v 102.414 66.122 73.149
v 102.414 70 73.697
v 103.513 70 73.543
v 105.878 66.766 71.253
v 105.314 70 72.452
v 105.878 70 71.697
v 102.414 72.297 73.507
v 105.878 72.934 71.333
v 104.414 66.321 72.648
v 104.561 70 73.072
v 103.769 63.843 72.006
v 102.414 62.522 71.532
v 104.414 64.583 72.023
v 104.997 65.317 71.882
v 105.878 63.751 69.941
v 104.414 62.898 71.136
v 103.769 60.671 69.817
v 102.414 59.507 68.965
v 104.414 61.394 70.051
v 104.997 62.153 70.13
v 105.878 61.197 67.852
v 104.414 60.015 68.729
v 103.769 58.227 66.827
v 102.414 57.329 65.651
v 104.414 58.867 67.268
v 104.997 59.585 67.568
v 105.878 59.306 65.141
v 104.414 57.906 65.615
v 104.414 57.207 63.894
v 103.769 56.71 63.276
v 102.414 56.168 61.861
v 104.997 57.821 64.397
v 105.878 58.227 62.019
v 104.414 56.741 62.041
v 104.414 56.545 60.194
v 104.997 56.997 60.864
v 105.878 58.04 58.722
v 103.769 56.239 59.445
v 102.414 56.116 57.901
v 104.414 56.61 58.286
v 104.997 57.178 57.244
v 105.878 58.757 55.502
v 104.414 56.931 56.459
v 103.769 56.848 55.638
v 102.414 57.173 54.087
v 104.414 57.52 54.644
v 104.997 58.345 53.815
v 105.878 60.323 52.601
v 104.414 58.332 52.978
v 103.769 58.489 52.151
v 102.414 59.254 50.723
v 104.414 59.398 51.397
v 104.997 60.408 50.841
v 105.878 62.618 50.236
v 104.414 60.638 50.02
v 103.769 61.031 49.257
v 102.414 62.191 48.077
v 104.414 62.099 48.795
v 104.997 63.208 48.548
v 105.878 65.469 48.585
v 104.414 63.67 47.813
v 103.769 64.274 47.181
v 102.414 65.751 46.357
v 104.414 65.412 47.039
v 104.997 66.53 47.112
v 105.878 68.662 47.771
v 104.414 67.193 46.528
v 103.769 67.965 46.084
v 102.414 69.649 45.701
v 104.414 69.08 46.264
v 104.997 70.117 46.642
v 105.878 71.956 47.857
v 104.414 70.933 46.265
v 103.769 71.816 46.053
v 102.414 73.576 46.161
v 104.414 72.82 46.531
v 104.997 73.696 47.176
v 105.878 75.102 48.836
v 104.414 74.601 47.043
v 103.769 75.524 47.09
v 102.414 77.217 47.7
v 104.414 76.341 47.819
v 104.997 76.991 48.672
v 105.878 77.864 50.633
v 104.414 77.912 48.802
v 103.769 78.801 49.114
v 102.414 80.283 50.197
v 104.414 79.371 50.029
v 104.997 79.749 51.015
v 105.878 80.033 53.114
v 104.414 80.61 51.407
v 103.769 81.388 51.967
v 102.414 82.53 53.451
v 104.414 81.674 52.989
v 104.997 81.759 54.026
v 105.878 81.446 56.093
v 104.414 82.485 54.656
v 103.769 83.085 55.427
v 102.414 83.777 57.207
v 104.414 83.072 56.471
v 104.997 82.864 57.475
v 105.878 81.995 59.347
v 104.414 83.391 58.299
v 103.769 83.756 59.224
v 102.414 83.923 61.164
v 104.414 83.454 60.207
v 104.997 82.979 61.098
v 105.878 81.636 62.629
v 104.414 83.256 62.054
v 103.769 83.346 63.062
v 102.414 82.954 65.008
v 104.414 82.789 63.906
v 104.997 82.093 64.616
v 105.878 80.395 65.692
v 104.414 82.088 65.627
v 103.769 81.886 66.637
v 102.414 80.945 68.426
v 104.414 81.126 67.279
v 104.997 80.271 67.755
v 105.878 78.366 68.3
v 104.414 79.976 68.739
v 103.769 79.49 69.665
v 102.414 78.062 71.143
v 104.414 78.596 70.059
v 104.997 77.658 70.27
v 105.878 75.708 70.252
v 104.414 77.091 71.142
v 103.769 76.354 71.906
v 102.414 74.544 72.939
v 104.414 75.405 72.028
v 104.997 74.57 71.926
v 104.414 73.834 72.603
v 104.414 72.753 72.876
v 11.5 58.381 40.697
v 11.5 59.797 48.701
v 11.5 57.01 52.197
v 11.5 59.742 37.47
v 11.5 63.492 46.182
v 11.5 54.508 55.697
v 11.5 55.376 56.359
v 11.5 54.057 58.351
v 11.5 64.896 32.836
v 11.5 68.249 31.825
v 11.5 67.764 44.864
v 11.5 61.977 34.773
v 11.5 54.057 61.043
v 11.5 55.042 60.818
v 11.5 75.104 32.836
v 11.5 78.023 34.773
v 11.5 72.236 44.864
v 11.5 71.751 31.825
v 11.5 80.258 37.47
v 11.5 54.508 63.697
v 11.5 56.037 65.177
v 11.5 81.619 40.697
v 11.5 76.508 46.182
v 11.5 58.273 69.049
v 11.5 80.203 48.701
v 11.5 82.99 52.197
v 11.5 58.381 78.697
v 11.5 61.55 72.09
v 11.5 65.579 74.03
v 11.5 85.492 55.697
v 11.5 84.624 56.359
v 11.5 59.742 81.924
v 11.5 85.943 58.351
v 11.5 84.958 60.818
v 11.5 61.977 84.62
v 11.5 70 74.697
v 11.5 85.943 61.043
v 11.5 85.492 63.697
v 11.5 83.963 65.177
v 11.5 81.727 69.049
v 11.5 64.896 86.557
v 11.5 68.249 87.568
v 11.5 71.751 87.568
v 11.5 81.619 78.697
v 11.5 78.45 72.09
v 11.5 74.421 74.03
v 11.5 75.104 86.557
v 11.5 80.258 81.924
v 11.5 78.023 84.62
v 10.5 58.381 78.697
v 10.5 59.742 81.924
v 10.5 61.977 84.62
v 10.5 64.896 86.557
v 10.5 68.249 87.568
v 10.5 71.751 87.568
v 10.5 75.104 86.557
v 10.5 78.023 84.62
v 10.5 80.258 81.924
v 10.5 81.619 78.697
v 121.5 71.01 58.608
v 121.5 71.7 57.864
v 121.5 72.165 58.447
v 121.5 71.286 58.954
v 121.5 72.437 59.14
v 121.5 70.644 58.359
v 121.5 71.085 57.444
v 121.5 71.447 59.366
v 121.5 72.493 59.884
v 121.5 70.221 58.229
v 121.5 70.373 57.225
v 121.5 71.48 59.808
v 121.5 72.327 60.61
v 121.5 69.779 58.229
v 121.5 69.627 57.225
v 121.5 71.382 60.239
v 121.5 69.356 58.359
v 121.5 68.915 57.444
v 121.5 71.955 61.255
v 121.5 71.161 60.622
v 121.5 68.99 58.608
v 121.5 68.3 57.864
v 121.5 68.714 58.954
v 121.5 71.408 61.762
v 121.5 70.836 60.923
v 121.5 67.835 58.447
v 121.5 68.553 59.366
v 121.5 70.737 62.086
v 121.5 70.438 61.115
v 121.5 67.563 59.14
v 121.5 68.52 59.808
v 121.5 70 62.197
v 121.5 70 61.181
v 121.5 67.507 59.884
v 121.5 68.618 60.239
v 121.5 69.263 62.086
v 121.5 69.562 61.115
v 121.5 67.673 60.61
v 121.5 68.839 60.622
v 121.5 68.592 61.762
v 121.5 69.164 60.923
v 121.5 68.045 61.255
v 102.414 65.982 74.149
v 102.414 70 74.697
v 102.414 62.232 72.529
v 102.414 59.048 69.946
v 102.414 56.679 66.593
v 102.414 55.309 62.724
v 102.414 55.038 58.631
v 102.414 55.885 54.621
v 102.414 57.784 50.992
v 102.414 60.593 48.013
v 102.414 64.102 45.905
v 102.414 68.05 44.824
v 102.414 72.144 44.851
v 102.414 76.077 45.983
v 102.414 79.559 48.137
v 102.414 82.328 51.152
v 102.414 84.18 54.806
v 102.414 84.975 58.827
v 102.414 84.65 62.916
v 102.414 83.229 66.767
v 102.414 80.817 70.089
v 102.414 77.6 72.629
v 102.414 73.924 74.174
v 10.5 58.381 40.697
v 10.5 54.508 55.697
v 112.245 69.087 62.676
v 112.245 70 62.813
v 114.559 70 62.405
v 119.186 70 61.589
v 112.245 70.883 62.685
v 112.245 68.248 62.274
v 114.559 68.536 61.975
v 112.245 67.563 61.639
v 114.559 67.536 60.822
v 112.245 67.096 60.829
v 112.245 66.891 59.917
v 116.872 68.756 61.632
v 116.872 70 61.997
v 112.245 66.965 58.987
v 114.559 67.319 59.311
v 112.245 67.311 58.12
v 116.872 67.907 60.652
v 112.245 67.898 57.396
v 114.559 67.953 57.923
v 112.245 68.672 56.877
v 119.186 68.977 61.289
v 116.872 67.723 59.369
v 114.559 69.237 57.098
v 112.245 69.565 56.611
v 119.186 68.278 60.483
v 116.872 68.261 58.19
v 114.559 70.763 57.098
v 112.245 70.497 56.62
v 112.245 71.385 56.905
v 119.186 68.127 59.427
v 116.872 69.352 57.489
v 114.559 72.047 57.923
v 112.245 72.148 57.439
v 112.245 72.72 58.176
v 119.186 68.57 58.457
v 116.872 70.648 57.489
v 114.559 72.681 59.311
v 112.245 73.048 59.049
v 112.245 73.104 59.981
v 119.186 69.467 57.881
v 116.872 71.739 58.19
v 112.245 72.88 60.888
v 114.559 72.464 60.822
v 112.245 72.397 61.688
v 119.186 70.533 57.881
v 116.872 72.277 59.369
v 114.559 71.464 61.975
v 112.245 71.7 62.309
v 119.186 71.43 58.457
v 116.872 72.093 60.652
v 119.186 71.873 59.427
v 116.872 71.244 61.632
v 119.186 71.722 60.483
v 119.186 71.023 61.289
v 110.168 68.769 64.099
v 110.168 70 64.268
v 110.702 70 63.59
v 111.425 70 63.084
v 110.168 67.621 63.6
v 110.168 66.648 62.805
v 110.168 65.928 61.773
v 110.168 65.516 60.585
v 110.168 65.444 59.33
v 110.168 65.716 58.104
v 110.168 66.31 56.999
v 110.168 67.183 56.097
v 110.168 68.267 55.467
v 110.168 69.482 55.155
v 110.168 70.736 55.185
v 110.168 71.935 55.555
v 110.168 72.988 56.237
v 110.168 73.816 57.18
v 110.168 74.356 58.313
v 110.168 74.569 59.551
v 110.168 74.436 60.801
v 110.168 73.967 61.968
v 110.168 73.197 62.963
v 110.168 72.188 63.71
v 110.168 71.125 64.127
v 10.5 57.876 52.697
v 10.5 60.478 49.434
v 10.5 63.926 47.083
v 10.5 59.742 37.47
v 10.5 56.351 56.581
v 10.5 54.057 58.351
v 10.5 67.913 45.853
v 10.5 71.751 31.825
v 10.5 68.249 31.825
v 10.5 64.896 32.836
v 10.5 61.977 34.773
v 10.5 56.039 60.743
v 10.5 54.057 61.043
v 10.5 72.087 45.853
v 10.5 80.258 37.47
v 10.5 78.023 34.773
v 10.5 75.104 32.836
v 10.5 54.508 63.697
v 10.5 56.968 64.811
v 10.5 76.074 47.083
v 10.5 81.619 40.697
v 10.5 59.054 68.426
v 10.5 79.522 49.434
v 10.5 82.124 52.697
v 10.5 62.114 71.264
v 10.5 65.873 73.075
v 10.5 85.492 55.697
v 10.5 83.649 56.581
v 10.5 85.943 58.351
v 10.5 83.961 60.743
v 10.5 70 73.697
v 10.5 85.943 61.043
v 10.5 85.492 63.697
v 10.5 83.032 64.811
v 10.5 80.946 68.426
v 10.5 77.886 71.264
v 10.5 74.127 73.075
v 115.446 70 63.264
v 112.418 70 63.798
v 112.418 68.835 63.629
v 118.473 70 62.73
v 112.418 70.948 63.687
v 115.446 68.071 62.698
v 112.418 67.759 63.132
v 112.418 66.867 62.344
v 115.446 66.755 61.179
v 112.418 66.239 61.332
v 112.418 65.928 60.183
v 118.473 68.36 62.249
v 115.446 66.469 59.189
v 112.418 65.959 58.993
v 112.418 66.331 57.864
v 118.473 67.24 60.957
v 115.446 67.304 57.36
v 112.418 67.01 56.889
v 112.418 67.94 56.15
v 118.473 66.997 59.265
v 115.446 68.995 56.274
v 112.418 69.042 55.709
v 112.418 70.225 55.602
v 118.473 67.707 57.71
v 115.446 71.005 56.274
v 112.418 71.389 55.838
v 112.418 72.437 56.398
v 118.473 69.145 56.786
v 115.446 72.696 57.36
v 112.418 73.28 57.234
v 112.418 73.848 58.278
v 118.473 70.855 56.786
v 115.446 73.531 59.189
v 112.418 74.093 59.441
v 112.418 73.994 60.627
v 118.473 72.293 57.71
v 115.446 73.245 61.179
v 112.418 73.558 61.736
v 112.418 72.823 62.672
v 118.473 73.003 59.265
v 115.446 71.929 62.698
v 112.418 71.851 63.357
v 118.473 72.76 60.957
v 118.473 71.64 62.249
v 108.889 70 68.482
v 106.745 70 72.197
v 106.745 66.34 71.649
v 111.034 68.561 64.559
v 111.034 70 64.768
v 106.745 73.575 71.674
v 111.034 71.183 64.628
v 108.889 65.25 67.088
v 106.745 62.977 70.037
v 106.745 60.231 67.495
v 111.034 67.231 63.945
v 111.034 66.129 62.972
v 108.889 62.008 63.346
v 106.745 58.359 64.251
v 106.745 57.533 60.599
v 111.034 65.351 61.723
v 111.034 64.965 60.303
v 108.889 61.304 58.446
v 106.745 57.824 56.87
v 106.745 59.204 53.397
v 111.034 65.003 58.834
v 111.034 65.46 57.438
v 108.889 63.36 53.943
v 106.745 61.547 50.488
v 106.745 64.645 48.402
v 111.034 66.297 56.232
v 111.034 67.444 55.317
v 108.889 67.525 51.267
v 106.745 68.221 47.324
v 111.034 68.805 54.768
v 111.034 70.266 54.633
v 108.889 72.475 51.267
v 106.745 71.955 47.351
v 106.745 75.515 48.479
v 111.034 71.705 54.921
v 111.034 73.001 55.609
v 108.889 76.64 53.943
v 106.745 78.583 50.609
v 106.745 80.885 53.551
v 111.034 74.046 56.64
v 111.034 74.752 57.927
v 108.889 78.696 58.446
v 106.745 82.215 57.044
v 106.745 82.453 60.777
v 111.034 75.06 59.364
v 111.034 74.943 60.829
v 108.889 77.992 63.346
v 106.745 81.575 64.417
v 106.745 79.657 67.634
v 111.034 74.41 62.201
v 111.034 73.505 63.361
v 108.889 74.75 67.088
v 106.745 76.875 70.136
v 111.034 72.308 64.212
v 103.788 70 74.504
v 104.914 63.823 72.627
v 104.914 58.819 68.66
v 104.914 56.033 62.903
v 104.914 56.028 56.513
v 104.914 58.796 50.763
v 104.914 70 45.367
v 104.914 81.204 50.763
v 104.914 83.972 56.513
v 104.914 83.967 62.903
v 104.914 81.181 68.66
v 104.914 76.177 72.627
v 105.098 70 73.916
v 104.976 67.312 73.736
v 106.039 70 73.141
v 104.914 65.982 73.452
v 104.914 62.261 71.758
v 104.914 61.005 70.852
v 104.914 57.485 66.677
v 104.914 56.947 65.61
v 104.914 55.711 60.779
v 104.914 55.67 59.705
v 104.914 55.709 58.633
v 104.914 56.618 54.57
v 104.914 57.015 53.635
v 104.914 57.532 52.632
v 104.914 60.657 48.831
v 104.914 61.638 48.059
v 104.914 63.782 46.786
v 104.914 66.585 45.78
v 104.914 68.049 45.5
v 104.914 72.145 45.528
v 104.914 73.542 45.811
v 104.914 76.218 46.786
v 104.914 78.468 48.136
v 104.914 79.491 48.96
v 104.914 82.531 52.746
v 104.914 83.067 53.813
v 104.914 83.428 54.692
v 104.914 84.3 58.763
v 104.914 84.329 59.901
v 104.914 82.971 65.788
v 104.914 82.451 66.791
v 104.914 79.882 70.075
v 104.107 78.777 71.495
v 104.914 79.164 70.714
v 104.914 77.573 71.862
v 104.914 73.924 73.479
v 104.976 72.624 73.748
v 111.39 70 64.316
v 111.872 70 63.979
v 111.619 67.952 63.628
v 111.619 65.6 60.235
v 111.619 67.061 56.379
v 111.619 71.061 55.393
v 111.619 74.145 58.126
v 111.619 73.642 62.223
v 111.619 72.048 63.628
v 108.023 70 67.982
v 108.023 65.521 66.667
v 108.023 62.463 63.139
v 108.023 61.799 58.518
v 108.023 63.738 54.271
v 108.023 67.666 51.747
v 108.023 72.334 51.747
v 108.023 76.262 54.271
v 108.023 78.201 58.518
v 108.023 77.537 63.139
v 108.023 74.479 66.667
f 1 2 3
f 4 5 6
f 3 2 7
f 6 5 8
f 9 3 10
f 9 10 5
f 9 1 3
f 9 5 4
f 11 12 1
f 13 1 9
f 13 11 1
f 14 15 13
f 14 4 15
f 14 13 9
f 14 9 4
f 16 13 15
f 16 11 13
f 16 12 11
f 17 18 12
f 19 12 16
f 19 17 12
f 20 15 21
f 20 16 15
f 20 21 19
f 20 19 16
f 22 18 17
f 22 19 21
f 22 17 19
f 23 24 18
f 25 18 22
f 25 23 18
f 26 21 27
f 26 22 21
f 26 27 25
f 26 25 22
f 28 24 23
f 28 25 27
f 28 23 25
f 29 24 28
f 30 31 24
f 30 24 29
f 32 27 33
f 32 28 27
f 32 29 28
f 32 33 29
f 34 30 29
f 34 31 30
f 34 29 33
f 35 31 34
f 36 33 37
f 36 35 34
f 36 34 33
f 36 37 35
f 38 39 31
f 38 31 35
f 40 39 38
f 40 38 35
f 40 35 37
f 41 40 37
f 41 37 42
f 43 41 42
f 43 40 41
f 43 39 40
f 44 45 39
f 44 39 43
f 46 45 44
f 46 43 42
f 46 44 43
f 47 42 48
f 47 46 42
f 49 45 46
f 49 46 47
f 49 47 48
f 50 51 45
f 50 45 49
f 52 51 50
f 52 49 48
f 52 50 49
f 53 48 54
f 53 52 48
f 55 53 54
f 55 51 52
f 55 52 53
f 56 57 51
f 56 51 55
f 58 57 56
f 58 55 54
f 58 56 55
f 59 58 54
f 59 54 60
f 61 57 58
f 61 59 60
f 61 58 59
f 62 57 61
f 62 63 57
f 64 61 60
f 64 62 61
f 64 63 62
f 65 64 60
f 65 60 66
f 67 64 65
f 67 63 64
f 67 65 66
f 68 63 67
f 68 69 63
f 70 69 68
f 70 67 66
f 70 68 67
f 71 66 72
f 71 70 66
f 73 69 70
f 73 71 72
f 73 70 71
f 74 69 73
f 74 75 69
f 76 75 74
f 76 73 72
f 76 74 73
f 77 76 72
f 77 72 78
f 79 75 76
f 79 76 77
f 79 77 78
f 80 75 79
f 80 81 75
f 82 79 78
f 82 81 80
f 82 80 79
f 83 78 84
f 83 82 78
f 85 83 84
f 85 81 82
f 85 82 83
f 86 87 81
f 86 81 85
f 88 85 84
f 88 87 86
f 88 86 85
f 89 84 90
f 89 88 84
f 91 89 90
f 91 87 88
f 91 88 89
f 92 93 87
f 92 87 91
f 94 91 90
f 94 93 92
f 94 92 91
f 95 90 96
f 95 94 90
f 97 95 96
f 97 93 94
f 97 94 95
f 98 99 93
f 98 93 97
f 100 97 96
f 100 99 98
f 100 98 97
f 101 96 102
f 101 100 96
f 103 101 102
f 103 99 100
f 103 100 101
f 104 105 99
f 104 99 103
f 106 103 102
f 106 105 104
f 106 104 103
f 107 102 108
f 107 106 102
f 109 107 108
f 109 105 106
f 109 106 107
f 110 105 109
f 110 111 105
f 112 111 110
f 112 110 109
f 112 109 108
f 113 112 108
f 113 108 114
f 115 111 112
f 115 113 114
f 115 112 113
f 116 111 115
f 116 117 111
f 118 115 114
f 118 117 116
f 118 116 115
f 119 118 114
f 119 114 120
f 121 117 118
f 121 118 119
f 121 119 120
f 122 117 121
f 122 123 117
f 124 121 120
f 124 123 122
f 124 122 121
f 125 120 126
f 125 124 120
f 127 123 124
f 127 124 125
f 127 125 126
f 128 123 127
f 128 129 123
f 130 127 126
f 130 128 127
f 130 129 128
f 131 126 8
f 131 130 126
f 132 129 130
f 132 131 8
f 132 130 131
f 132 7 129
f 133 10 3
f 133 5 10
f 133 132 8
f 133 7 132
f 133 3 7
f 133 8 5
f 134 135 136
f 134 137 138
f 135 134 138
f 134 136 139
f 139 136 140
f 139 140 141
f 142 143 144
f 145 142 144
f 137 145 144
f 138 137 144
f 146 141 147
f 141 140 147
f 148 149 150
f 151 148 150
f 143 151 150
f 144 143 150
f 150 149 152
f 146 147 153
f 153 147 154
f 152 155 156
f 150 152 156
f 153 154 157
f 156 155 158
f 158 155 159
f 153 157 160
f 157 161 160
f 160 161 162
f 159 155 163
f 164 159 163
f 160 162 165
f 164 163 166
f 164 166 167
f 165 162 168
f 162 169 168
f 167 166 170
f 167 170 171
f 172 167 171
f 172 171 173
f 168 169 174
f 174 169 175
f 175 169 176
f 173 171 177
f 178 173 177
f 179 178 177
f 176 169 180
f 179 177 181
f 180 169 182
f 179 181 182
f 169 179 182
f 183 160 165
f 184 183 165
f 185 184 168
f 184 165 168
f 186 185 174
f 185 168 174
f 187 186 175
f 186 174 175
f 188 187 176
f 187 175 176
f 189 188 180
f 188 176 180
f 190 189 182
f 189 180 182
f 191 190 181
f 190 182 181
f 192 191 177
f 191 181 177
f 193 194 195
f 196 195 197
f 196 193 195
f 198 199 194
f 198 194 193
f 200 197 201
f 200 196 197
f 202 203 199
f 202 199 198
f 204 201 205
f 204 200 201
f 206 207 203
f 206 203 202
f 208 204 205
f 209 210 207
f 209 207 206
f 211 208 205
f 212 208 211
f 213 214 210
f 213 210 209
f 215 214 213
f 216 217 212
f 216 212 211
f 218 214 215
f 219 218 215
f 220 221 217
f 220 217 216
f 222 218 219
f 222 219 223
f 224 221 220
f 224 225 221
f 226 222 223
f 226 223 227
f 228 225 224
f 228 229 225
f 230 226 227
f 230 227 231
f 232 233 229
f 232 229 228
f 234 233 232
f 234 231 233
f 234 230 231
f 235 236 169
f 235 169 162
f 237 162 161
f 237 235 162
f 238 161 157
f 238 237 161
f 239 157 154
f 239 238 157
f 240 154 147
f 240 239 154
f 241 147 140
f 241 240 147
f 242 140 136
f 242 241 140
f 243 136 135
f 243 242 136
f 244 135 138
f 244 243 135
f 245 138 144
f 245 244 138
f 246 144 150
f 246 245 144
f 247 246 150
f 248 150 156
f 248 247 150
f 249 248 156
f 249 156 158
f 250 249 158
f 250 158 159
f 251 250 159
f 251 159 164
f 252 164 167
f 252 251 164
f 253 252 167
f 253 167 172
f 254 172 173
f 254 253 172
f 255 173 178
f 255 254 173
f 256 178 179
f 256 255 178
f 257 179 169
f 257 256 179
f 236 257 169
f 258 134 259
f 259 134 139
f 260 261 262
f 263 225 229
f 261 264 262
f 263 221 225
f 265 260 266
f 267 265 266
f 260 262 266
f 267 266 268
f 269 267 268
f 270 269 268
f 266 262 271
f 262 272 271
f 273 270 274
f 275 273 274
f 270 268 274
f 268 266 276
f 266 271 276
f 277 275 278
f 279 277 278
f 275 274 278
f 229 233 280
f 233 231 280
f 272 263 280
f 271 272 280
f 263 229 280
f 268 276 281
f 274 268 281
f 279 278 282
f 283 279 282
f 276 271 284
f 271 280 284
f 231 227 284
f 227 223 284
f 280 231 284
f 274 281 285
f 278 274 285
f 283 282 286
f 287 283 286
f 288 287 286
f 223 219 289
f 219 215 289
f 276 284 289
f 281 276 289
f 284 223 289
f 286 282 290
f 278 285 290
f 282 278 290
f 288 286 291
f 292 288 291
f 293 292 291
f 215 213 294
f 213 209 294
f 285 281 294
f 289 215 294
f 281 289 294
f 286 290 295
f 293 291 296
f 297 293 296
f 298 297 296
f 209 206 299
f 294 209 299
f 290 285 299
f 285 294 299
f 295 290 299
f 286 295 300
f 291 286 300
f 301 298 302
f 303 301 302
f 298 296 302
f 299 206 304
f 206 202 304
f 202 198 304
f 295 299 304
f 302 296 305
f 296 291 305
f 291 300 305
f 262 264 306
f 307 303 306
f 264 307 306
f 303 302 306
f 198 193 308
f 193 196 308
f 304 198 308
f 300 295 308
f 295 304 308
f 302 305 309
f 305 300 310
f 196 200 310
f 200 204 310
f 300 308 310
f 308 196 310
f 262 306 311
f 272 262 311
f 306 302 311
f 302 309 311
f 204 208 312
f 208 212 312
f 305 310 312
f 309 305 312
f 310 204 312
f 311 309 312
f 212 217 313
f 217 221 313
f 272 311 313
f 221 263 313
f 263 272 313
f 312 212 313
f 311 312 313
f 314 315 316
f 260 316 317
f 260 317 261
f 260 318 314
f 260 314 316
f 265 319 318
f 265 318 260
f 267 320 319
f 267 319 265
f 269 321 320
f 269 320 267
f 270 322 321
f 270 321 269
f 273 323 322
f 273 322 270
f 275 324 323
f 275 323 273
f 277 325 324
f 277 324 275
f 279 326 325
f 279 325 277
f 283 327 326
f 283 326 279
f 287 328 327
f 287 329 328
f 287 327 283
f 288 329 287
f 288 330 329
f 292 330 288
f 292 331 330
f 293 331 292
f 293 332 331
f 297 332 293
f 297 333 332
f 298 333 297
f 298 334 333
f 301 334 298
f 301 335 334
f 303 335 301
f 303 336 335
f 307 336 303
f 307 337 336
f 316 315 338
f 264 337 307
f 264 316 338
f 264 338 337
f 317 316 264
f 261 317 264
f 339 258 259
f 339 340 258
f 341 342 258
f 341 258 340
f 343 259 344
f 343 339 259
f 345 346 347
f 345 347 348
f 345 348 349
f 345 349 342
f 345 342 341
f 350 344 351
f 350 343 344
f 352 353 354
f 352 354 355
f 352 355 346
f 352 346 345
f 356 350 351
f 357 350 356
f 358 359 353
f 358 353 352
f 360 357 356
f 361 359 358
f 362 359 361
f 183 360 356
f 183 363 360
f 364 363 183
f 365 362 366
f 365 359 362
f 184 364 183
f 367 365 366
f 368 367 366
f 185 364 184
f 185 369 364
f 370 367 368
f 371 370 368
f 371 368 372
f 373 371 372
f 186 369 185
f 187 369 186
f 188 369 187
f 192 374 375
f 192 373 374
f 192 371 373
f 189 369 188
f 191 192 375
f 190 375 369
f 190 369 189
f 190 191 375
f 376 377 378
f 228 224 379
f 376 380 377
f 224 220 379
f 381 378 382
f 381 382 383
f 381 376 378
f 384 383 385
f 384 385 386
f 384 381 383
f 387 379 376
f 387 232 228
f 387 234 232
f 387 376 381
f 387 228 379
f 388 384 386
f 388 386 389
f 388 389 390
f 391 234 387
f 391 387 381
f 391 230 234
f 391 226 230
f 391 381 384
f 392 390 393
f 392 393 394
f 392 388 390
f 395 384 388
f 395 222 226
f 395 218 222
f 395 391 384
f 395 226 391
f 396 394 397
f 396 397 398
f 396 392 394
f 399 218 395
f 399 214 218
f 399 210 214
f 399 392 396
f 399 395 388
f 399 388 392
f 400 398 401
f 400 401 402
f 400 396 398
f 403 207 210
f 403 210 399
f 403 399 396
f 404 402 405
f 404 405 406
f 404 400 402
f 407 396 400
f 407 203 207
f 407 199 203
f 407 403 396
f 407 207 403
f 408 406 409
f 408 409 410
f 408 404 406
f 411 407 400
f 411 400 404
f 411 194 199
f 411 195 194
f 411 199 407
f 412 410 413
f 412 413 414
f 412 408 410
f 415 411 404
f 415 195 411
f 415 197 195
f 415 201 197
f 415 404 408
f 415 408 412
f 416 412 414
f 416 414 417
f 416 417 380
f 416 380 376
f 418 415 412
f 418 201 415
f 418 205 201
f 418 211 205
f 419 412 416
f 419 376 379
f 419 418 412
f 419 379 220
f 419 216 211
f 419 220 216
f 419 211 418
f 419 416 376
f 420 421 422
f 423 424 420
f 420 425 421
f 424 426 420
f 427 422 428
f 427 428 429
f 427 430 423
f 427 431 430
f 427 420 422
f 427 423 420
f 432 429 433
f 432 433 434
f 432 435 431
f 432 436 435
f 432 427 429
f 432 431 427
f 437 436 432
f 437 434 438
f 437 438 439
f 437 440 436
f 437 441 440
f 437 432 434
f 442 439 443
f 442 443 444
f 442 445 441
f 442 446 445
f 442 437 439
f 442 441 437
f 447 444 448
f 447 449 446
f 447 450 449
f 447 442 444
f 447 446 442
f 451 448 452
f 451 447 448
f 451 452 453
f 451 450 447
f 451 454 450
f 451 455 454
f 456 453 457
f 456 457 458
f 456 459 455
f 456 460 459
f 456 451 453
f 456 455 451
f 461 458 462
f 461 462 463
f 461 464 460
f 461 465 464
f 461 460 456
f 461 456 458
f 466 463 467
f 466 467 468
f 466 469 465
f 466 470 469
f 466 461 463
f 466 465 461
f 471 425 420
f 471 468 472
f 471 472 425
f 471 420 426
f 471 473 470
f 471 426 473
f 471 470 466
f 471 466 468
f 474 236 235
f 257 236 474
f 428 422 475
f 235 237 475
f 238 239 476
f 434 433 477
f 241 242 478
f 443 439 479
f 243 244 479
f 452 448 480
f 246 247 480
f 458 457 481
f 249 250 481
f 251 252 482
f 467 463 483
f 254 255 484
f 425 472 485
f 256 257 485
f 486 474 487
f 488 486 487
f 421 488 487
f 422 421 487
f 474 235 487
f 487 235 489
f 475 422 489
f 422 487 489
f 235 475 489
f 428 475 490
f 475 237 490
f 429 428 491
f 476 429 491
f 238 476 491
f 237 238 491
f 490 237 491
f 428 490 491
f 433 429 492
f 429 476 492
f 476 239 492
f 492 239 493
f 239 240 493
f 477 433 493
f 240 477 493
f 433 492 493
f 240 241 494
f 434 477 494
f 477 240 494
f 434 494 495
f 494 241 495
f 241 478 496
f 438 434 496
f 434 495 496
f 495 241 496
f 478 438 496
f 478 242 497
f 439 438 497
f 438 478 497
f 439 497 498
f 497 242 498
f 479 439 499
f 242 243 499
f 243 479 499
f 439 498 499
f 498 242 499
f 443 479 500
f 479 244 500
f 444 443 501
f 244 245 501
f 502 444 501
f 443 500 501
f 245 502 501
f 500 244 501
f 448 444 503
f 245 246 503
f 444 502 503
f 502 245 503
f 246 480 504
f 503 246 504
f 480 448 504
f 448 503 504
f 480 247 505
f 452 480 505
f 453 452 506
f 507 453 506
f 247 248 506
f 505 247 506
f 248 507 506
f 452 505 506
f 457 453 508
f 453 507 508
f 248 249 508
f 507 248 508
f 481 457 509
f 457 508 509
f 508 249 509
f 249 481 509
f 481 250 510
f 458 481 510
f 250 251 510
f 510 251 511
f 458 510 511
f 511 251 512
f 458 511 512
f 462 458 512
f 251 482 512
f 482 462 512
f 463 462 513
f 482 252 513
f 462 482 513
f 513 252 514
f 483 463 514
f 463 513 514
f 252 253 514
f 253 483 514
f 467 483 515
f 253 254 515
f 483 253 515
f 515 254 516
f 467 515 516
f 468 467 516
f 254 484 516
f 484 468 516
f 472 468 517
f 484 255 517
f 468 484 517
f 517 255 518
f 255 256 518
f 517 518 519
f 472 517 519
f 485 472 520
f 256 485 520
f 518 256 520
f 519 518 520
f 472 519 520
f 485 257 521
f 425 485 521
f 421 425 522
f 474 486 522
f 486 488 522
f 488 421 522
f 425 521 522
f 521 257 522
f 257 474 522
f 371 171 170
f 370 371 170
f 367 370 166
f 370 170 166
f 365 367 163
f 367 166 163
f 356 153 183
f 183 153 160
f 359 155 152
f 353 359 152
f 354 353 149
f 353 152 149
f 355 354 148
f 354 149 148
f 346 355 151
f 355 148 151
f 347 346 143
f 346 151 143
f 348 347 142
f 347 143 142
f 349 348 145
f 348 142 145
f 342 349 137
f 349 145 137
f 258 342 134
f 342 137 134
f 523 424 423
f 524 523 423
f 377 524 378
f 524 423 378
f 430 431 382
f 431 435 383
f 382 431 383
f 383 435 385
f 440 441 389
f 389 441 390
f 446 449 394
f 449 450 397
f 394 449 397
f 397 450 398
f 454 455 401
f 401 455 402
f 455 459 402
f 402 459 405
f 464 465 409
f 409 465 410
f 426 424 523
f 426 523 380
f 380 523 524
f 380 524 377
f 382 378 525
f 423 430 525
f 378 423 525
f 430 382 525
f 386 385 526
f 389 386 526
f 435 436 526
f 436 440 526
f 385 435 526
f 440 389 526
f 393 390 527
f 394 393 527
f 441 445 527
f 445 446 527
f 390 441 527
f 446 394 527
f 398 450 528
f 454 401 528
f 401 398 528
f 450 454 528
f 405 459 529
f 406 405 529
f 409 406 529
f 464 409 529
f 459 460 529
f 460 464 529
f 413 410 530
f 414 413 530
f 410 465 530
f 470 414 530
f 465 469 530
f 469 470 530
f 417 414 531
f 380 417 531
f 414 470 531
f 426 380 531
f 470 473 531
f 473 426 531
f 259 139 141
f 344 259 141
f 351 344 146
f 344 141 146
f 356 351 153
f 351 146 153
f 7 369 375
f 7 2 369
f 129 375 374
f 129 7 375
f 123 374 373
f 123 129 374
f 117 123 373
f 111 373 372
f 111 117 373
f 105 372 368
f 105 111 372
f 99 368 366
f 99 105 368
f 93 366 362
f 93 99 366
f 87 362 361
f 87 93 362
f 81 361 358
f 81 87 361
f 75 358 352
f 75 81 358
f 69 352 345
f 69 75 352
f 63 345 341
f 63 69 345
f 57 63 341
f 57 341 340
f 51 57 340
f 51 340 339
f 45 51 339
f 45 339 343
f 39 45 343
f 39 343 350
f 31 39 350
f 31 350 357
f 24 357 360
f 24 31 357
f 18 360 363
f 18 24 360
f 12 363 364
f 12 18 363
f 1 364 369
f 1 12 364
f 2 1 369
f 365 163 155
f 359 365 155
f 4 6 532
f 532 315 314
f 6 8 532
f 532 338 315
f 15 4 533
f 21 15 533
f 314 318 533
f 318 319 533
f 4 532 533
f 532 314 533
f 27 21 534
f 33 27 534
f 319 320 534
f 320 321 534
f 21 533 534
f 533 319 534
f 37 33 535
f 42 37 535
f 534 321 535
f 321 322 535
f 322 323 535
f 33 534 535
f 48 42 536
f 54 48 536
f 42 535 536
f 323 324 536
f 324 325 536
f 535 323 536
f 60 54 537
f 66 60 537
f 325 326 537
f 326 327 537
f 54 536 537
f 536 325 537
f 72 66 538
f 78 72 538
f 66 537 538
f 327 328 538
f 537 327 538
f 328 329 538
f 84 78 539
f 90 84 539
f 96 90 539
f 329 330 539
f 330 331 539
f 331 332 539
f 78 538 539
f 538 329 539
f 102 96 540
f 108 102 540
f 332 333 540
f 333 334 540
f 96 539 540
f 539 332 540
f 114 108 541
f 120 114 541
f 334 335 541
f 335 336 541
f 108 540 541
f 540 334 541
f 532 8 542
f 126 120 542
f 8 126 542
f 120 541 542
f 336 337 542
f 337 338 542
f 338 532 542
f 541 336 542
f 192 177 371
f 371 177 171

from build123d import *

# Parameters (mm, degrees)
BOSS_EXTRUDE1_DEPTH     = 90
FILLET1_R               = 7.5
FILLET2_R               = 2
SKETCH2_W               = 20
SKETCH2_H               = 80
SKETCH2_W_2             = 32
BOSS_EXTRUDE2_DEPTH     = 20
SKETCH3_R               = 2.5
BOSS_EXTRUDE3_DEPTH     = 111
BOSS_EXTRUDE4_START     = 7.5
SKETCH4_W               = 80
SKETCH4_H               = 20
SKETCH4_R               = 3.25
BOSS_EXTRUDE4_DEPTH     = 20
MOVE_FACE1_BY           = 1.5
MOVE_FACE2_BY           = 1.5
FILLET3_R               = 4
FILLET4_R               = 4
CUT_EXTRUDE1_DEPTH      = 2
BOSS_EXTRUDE5_DEPTH     = 2
SKETCH7_W               = 58
SKETCH7_H               = 15
CUT_EXTRUDE2_DEPTH      = 0.5
SKETCH8_R               = 10
BOSS_EXTRUDE6_DEPTH     = 1.5
SKETCH10_R              = 4.25
SKETCH10_R_2            = 2.75
CUT_EXTRUDE_THIN1_DEPTH = 1.5
SKETCH11_RX             = 5
SKETCH11_RY             = 2.5
BOSS_EXTRUDE7_DEPTH     = 1.5
LPATTERN1_COUNT         = 3
LPATTERN1_PITCH         = 24
SKETCH12_RX             = 5
SKETCH12_RY             = 2.5
BOSS_EXTRUDE8_DEPTH     = 1.5
LPATTERN2_START         = 113.13708499
LPATTERN2_DEPTH         = 1.5
FILLET7_R               = 7.5
FILLET5_R               = 5
FILLET6_R               = 2
SHELL1_T                = -1
SKETCH14_R              = 14
BOSS_EXTRUDE9_DEPTH     = 1
BOSS_EXTRUDE10_DEPTH    = 1
BOSS_EXTRUDE11_START    = -30
SKETCH16_R              = 13
BOSS_EXTRUDE11_DEPTH    = 10
BOSS_EXTRUDE12_REACH    = 233.484
SKETCH18_R              = 3
SKETCH17_W              = 1.5
SKETCH17_H              = 20
SKETCH17_W_2            = 20
SKETCH17_H_2            = 1.5
EXTRUDE_THIN1_DEPTH     = 63.5
SKETCH20_R              = 12.5
BOSS_EXTRUDE13_DEPTH    = 5
FILLET8_R               = 2


# Read off the part's stored shape, not the designer's step: LPattern2, Body-Move/Copy1
with BuildPart() as part:
    # Sketch1 → Boss-Extrude1 (new, symmetric)
    with BuildSketch(Plane(origin=(0, 0, 0), x_dir=(0, 0, -1), z_dir=(1, 0, 0))):
        Polygon((0, 0), (0, 45), (-115, 45), (-160, 0), align=None)
    extrude(amount=BOSS_EXTRUDE1_DEPTH, both=True)

    # Fillet1
    fillet1_edges = [part.edges().sort_by_distance(p)[0] for p in [
        (0, 0, 160),
        (0, 45, 115),
        (0, 45, 0),
        (0, 0, 0),
    ]]
    fillet(fillet1_edges, radius=FILLET1_R)

    # Fillet2
    fillet2_edges = [part.edges().sort_by_distance(p)[0] for p in [
        (-90, 0, 74.696699141),
        (90, 0, 74.696699141),
        (-90, 27.803300859, 132.196699141),
        (-90, 45, 59.696699141),
        (-90, 22.5, 0),
        (-90, 44.429096494, 114.763524025),
        (-90, 2.196699141, 2.196699141),
        (-90, 42.803300859, 2.196699141),
        (-90, 4.629874257, 148.822494776),
        (90, 27.803300859, 132.196699141),
        (90, 22.5, 0),
        (90, 45, 59.696699141),
        (90, 44.429096494, 114.763524025),
        (90, 2.196699141, 2.196699141),
        (90, 42.803300859, 2.196699141),
        (90, 4.629874257, 148.822494776),
    ]]
    fillet(fillet2_edges, radius=FILLET2_R)

    # Sketch2 → Boss-Extrude2 (add)
    with BuildSketch(Plane(origin=(0, 45, 0), x_dir=(1, 0, 0), z_dir=(0, 1, 0))):
        with Locations((-71.5, -59.696699141)):
            Rectangle(SKETCH2_W, SKETCH2_H)
        with Locations((65.5, -59.696699141)):
            Rectangle(SKETCH2_W_2, SKETCH2_H)
    extrude(amount=BOSS_EXTRUDE2_DEPTH)

    # Sketch3 → Boss-Extrude3 (add)
    with BuildSketch(Plane(origin=(-61.5, 0, 0), x_dir=(0, 0, -1), z_dir=(1, 0, 0))):
        with Locations(Location((-89.696699141, 59.5, 0), (0, 0, 180))):
            Circle(SKETCH3_R)
        with Locations(Location((-89.696699141, 50.5, 0), (0, 0, 180))):
            Circle(SKETCH3_R)
        with Locations(Location((-29.696699141, 50.5, 0), (0, 0, 180))):
            Circle(SKETCH3_R)
        with Locations(Location((-29.696699141, 59.5, 0), (0, 0, 180))):
            Circle(SKETCH3_R)
    extrude(amount=BOSS_EXTRUDE3_DEPTH)

    # Fillet3
    fillet3_edges = [part.edges().sort_by_distance(p)[0] for p in [
        (65.5, 65, 99.696699141),
        (65.5, 65, 19.696699141),
        (-71.5, 65, 99.696699141),
        (-71.5, 65, 19.696699141),
    ]]
    fillet(fillet3_edges, radius=FILLET3_R)

    # Sketch5 → Cut-Extrude1 (cut)
    with BuildSketch(Plane(origin=(0, 80, 80), x_dir=(1, 0, 0), z_dir=(0, 0.7071067811865511, 0.707106781186544))):
        with BuildLine():
            Line((-65, -56.317279836), (65, -56.317279836))
            ThreePointArc((65, -56.317279836), (66.767766953, -57.049512883), (67.5, -58.817279836))
            Line((67.5, -58.817279836), (67.5, -88.817279836))
            ThreePointArc((67.5, -88.817279836), (66.767766953, -90.585046789), (65, -91.317279836))
            Line((65, -91.317279836), (-65, -91.317279836))
            ThreePointArc((-65, -91.317279836), (-66.767766953, -90.585046789), (-67.5, -88.817279836))
            Line((-67.5, -88.817279836), (-67.5, -58.817279836))
            ThreePointArc((-67.5, -58.817279836), (-66.767766953, -57.049512883), (-65, -56.317279836))
        make_face()
    extrude(amount=-CUT_EXTRUDE1_DEPTH, mode=Mode.SUBTRACT)


with BuildPart() as body_2:
    # Sketch4 → Boss-Extrude4 (new body)
    with BuildSketch(Plane(origin=(-61.5, 0, 0), x_dir=(0, 0, -1), z_dir=(1, 0, 0)).offset(BOSS_EXTRUDE4_START)):
        with Locations((-59.696699141, 55)):
            Rectangle(SKETCH4_W, SKETCH4_H)
        with Locations((-89.696699141, 59.5)):
            Circle(SKETCH4_R, mode=Mode.SUBTRACT)
        with Locations((-89.696699141, 50.5)):
            Circle(SKETCH4_R, mode=Mode.SUBTRACT)
        with Locations((-29.696699141, 59.5)):
            Circle(SKETCH4_R, mode=Mode.SUBTRACT)
        with Locations((-29.696699141, 50.5)):
            Circle(SKETCH4_R, mode=Mode.SUBTRACT)
    extrude(amount=BOSS_EXTRUDE4_DEPTH)

    # Move Face1: a face moved outward by 1.5
    extrude(body_2.faces().sort_by_distance((-44, 65, 59.696699141))[0], amount=MOVE_FACE1_BY, dir=(0, 1, 0))

    # Move Face2: a face moved inward by 1.5
    extrude(body_2.faces().sort_by_distance((-44, 45, 59.696699141))[0], amount=MOVE_FACE2_BY, dir=(0, 1, 0), mode=Mode.SUBTRACT)

    # Fillet4
    fillet4_edges = [body_2.edges().sort_by_distance(p)[0] for p in [
        (-44, 66.5, 99.696699141),
        (-44, 66.5, 19.696699141),
        (-44, 46.5, 19.696699141),
        (-44, 46.5, 99.696699141),
    ]]
    fillet(fillet4_edges, radius=FILLET4_R)


with BuildPart() as body_3:
    # Sketch6 → Boss-Extrude5 (new body)
    with BuildSketch(Plane(origin=(0, 78.585786438, 78.585786438), x_dir=(1, 0, 0), z_dir=(0, 0.7071067811865509, 0.7071067811865441))):
        with BuildLine():
            Line((65, -56.317279836), (-65, -56.317279836))
            ThreePointArc((-65, -56.317279836), (-66.767766953, -57.049512883), (-67.5, -58.817279836))
            Line((-67.5, -58.817279836), (-67.5, -88.817279836))
            ThreePointArc((-67.5, -88.817279836), (-66.767766953, -90.585046789), (-65, -91.317279836))
            Line((-65, -91.317279836), (65, -91.317279836))
            ThreePointArc((65, -91.317279836), (66.767766953, -90.585046789), (67.5, -88.817279836))
            Line((67.5, -88.817279836), (67.5, -58.817279836))
            ThreePointArc((67.5, -58.817279836), (66.767766953, -57.049512883), (65, -56.317279836))
        make_face()
    extrude(amount=BOSS_EXTRUDE5_DEPTH)

    # Sketch7 → Cut-Extrude2 (cut)
    with BuildSketch(Plane(origin=(0, 80, 80), x_dir=(1, 0, 0), z_dir=(0, 0.7071067811865509, 0.7071067811865441))):
        with Locations((-28.5, -71.817279836)):
            Rectangle(SKETCH7_W, SKETCH7_H)
    extrude(amount=-CUT_EXTRUDE2_DEPTH, mode=Mode.SUBTRACT)

    # Sketch8 → Boss-Extrude6 (add)
    with BuildSketch(Plane(origin=(0, 80, 80), x_dir=(1, 0, 0), z_dir=(0, 0.7071067811865509, 0.7071067811865441))):
        with Locations(Location((15.5, -71.817279836, 0), (0, 0, 270))):
            Circle(SKETCH8_R)
    extrude(amount=BOSS_EXTRUDE6_DEPTH)

    # Sketch10 → Cut-Extrude-Thin1 (cut)
    # profile 1 of 5: a face of its own
    with BuildSketch(Plane(origin=(0, 81.060660172, 81.060660172), x_dir=(1, 0, 0), z_dir=(0, 0.7071067811865509, 0.7071067811865441))):
        with Locations((15.5, -71.817279836)):
            Circle(SKETCH10_R)
        with Locations((15.5, -71.817279836)):
            Circle(SKETCH10_R_2, mode=Mode.SUBTRACT)
    # profile 2 of 5: a face of its own
    with BuildSketch(Plane(origin=(0, 81.060660172, 81.060660172), x_dir=(1, 0, 0), z_dir=(0, 0.7071067811865509, 0.7071067811865441))):
        Polygon((7.898602102, -65.27654211), (12.49479618, -69.872736188), (13.555456352, -68.812076016), (8.959262274, -64.215881939), align=None)
    # profile 3 of 5: a face of its own
    with BuildSketch(Plane(origin=(0, 81.060660172, 81.060660172), x_dir=(1, 0, 0), z_dir=(0, 0.7071067811865509, 0.7071067811865441))):
        Polygon((22.040737726, -64.215881939), (17.444543648, -68.812076016), (18.50520382, -69.872736188), (23.101397898, -65.27654211), align=None)
    # profile 4 of 5: a face of its own
    with BuildSketch(Plane(origin=(0, 81.060660172, 81.060660172), x_dir=(1, 0, 0), z_dir=(0, 0.7071067811865509, 0.7071067811865441))):
        Polygon((17.444543648, -74.822483656), (22.040737726, -79.418677734), (23.101397898, -78.358017562), (18.50520382, -73.761823485), align=None)
    # profile 5 of 5: a face of its own
    with BuildSketch(Plane(origin=(0, 81.060660172, 81.060660172), x_dir=(1, 0, 0), z_dir=(0, 0.7071067811865509, 0.7071067811865441))):
        Polygon((12.49479618, -73.761823485), (7.898602102, -78.358017562), (8.959262274, -79.418677734), (13.555456352, -74.822483656), align=None)
    extrude(amount=-CUT_EXTRUDE_THIN1_DEPTH, mode=Mode.SUBTRACT)

    # Sketch11 → Boss-Extrude7 (add)
    with BuildSketch(Plane(origin=(0, 80, 80), x_dir=(1, 0, 0), z_dir=(0, 0.7071067811865509, 0.7071067811865441))):
        with Locations((-52.5, -85.317279836)):
            Ellipse(SKETCH11_RX, SKETCH11_RY)
    boss_extrude7 = extrude(amount=BOSS_EXTRUDE7_DEPTH)

    # LPattern1: Boss-Extrude7 ×3
    with Locations(*[(i * LPATTERN1_PITCH, 0, 0) for i in range(1, LPATTERN1_COUNT)]):
        add(boss_extrude7)

    # Sketch12 → Boss-Extrude8 (add)
    with BuildSketch(Plane(origin=(0, 80, 80), x_dir=(1, 0, 0), z_dir=(0, 0.7071067811865509, 0.7071067811865441))):
        with Locations((32.5, -66.317279836)):
            Ellipse(SKETCH12_RX, SKETCH12_RY)
    extrude(amount=BOSS_EXTRUDE8_DEPTH)

    # LPattern2 outline → LPattern2 (add)
    with BuildSketch(Plane(origin=(0, 0, 0), x_dir=(1, 0, 0), z_dir=(0, 0.707106781186551, 0.7071067811865439)).offset(LPATTERN2_START)):
        with BuildLine():
            add(Edge.make_bspline(
                [(37.5, -74.317279836), (37.5, -69.987152818), (30, -72.152216327), (22.5, -74.317279836), (30, -76.482343346), (37.5, -78.647406855), (37.5, -74.317279836)],
                knots=[0, 0, 0, 2.094395102, 2.094395102, 4.188790205, 4.188790205, 6.283185307, 6.283185307, 6.283185307], degree=2, weights=[1, 0.5, 1, 0.5, 1, 0.5, 1]))
        make_face()
        with BuildLine():
            add(Edge.make_bspline(
                [(37.5, -82.317279836), (37.5, -77.987152818), (30, -80.152216327), (22.5, -82.317279836), (30, -84.482343346), (37.5, -86.647406855), (37.5, -82.317279836)],
                knots=[0, 0, 0, 2.094395102, 2.094395102, 4.188790205, 4.188790205, 6.283185307, 6.283185307, 6.283185307], degree=2, weights=[1, 0.5, 1, 0.5, 1, 0.5, 1]))
        make_face()
        with BuildLine():
            add(Edge.make_bspline(
                [(49.5, -66.317279836), (49.5, -61.987152818), (42, -64.152216327), (34.5, -66.317279836), (42, -68.482343346), (49.5, -70.647406855), (49.5, -66.317279836)],
                knots=[0, 0, 0, 2.094395102, 2.094395102, 4.188790205, 4.188790205, 6.283185307, 6.283185307, 6.283185307], degree=2, weights=[1, 0.5, 1, 0.5, 1, 0.5, 1]))
        make_face()
        with BuildLine():
            add(Edge.make_bspline(
                [(49.5, -74.317279836), (49.5, -69.987152818), (42, -72.152216327), (34.5, -74.317279836), (42, -76.482343346), (49.5, -78.647406855), (49.5, -74.317279836)],
                knots=[0, 0, 0, 2.094395102, 2.094395102, 4.188790205, 4.188790205, 6.283185307, 6.283185307, 6.283185307], degree=2, weights=[1, 0.5, 1, 0.5, 1, 0.5, 1]))
        make_face()
        with BuildLine():
            add(Edge.make_bspline(
                [(49.5, -82.317279836), (49.5, -77.987152818), (42, -80.152216327), (34.5, -82.317279836), (42, -84.482343346), (49.5, -86.647406855), (49.5, -82.317279836)],
                knots=[0, 0, 0, 2.094395102, 2.094395102, 4.188790205, 4.188790205, 6.283185307, 6.283185307, 6.283185307], degree=2, weights=[1, 0.5, 1, 0.5, 1, 0.5, 1]))
        make_face()
        with BuildLine():
            add(Edge.make_bspline(
                [(61.5, -66.317279836), (61.5, -61.987152818), (54, -64.152216327), (46.5, -66.317279836), (54, -68.482343346), (61.5, -70.647406855), (61.5, -66.317279836)],
                knots=[0, 0, 0, 2.094395102, 2.094395102, 4.188790205, 4.188790205, 6.283185307, 6.283185307, 6.283185307], degree=2, weights=[1, 0.5, 1, 0.5, 1, 0.5, 1]))
        make_face()
        with BuildLine():
            add(Edge.make_bspline(
                [(61.5, -74.317279836), (61.5, -69.987152818), (54, -72.152216327), (46.5, -74.317279836), (54, -76.482343346), (61.5, -78.647406855), (61.5, -74.317279836)],
                knots=[0, 0, 0, 2.094395102, 2.094395102, 4.188790205, 4.188790205, 6.283185307, 6.283185307, 6.283185307], degree=2, weights=[1, 0.5, 1, 0.5, 1, 0.5, 1]))
        make_face()
        with BuildLine():
            add(Edge.make_bspline(
                [(61.5, -82.317279836), (61.5, -77.987152818), (54, -80.152216327), (46.5, -82.317279836), (54, -84.482343346), (61.5, -86.647406855), (61.5, -82.317279836)],
                knots=[0, 0, 0, 2.094395102, 2.094395102, 4.188790205, 4.188790205, 6.283185307, 6.283185307, 6.283185307], degree=2, weights=[1, 0.5, 1, 0.5, 1, 0.5, 1]))
        make_face()
    extrude(amount=LPATTERN2_DEPTH)


with BuildPart() as body_4:
    # Sketch13 → Revolve1 (revolve)
    with BuildSketch(Plane.XY.offset(59.696699141), mode=Mode.PRIVATE) as revolve1_sk:
        Polygon((11.5, 70), (11.5, 85), (105.301145933, 85), (111.5, 74.263269807), (121.5, 72.5), (121.5, 70), align=None)
    revolve(revolve1_sk.sketch.rotate(Axis((11.5, 70, 59.696699141), (1, 0, 0)), 90), axis=Axis((11.5, 70, 59.696699141), (1, 0, 0)))

    # Fillet5
    fillet5_edges = [body_4.edges().sort_by_distance(p)[0] for p in [
        (105.301145933, 70, 44.696699141),
    ]]
    fillet(fillet5_edges, radius=FILLET5_R)

    # Fillet6
    fillet6_edges = [body_4.edges().sort_by_distance(p)[0] for p in [
        (111.5, 70, 55.433429334),
    ]]
    fillet(fillet6_edges, radius=FILLET6_R)

    # Shell1
    shell1_openings = [body_4.faces().sort_by_distance(p)[0] for p in [
        (121.5, 70, 59.696699141),
        (11.5, 70, 59.696699141),
    ]]
    offset(amount=SHELL1_T, openings=shell1_openings, kind=Kind.INTERSECTION)

    # Sketch14 → Boss-Extrude9 (add)
    with BuildSketch(Plane.ZY.offset(-11.5)):
        with BuildLine():
            Line((55.696699141, 85.491933385), (40.696699141, 81.618950039))
            ThreePointArc((40.696699141, 81.618950039), (31.696699141, 70), (40.696699141, 58.381049961))
            Line((40.696699141, 58.381049961), (55.696699141, 54.508066615))
            ThreePointArc((55.696699141, 54.508066615), (59.696699141, 54), (63.696699141, 54.508066615))
            Line((63.696699141, 54.508066615), (78.696699141, 58.381049961))
            ThreePointArc((78.696699141, 58.381049961), (87.696699141, 70), (78.696699141, 81.618950039))
            Line((78.696699141, 81.618950039), (63.696699141, 85.491933385))
            ThreePointArc((63.696699141, 85.491933385), (59.696699141, 86), (55.696699141, 85.491933385))
        make_face()
        with Locations((59.696699141, 70)):
            Circle(SKETCH14_R, mode=Mode.SUBTRACT)
    extrude(amount=BOSS_EXTRUDE9_DEPTH)


with BuildPart() as body_5:
    # Body-Move/Copy1 outline → Body-Move/Copy1 (revolve)
    with BuildSketch(Plane(origin=(0, 70, 59.696699141), x_dir=(0, 1, 0), z_dir=(0, 0, -1))):
        Polygon((0, 121.5), (0, 11.5), (15, 11.5), (15, 105.301145933), (4.263269807, 111.5), (2.5, 121.5), align=None)
    revolve(axis=Axis((0, 70, 59.696699141), (1, 0, 0)))


with BuildPart() as part_1:
    add(part.part)

    # Combine1: cut body 5
    add(body_5.part, mode=Mode.SUBTRACT)

    # Fillet7
    fillet7_edges = [part_1.edges().sort_by_distance(p)[0] for p in [
        (65.5, 65, 73.838834765),
        (65.5, 65, 45.554563517),
    ]]
    fillet(fillet7_edges, radius=FILLET7_R)

    # Sketch20 → Boss-Extrude13 (add)
    with BuildSketch(Plane.XZ):
        with Locations(Location((-60, 116.893398282, 0), (0, 0, 90))):
            Circle(SKETCH20_R)
        with Locations(Location((-60, 32.5, 0), (0, 0, 90))):
            Circle(SKETCH20_R)
        with Locations(Location((60, 32.5, 0), (0, 0, 90))):
            Circle(SKETCH20_R)
        with Locations(Location((60, 116.893398282, 0), (0, 0, 90))):
            Circle(SKETCH20_R)
    extrude(amount=BOSS_EXTRUDE13_DEPTH)

    # Fillet8
    fillet8_edges = [part_1.edges().sort_by_distance(p)[0] for p in [
        (-60, -5, 104.393398282),
        (-60, -5, 20),
        (60, -5, 20),
        (60, -5, 104.393398282),
    ]]
    fillet(fillet8_edges, radius=FILLET8_R)


with BuildPart() as body_5_2:
    # Sketch15 → Boss-Extrude10 (new body)
    with BuildSketch(Plane(origin=(-34, 0, 0), x_dir=(0, 0, -1), z_dir=(1, 0, 0))):
        with BuildLine():
            Line((-63.696699141, 85.491933385), (-78.696699141, 81.618950039))
            ThreePointArc((-78.696699141, 81.618950039), (-87.696699141, 70), (-78.696699141, 58.381049961))
            Line((-78.696699141, 58.381049961), (-63.696699141, 54.508066615))
            ThreePointArc((-63.696699141, 54.508066615), (-59.696699141, 54), (-55.696699141, 54.508066615))
            Line((-55.696699141, 54.508066615), (-40.696699141, 58.381049961))
            ThreePointArc((-40.696699141, 58.381049961), (-31.696699141, 70), (-40.696699141, 81.618950039))
            Line((-40.696699141, 81.618950039), (-55.696699141, 85.491933385))
            ThreePointArc((-55.696699141, 85.491933385), (-59.696699141, 86), (-63.696699141, 85.491933385))
        make_face()
    extrude(amount=BOSS_EXTRUDE10_DEPTH)


with BuildPart() as body_6:
    # Sketch16 → Boss-Extrude11 (new body)
    with BuildSketch(Plane.ZY.offset(-10.5).offset(BOSS_EXTRUDE11_START)):
        with Locations((59.696699141, 70)):
            Circle(SKETCH16_R)
    extrude(amount=BOSS_EXTRUDE11_DEPTH)

    # Sketch18 → Boss-Extrude12 (add, up to next)
    with BuildSketch(Plane(origin=(-33, 0, 0), x_dir=(0, 0, -1), z_dir=(1, 0, 0)), mode=Mode.PRIVATE) as boss_extrude12_sk1:
        with Locations(Location((-59.696699141, 70, 0), (0, 0, 180))):
            Circle(SKETCH18_R)
    boss_extrude12_tool1 = extrude(boss_extrude12_sk1.sketch, amount=BOSS_EXTRUDE12_REACH, mode=Mode.PRIVATE) - body_6.part

    add(body_5_2.part)  # Boss-Extrude12 merges body 5 2
    add(boss_extrude12_tool1.solids().sort_by_distance((-33, 70, 59.696699))[0])

    # Sketch17 → Extrude-Thin1 (add)
    with BuildSketch(Plane(origin=(-33, 0, 0), x_dir=(0, 0, -1), z_dir=(1, 0, 0))):
        with Locations((-59.696699141, 70)):
            Rectangle(SKETCH17_W, SKETCH17_H)
        with Locations((-59.696699141, 70)):
            Rectangle(SKETCH17_W_2, SKETCH17_H_2)
    extrude(amount=EXTRUDE_THIN1_DEPTH)

    # Sketch19 → Cut-Revolve3 (revolve, cut)
    with BuildSketch(Plane.XY.offset(59.696699141), mode=Mode.PRIVATE) as cut_revolve3_sk:
        Polygon((-33, 76.452368755), (-18, 80), (-18, 81.618950039), (-33, 81.618950039), align=None)
    revolve(cut_revolve3_sk.sketch.rotate(Axis((111.5, 70, 59.696699141), (-1, 0, 0)), 270), axis=Axis((111.5, 70, 59.696699141), (-1, 0, 0)), mode=Mode.SUBTRACT)


solid = body_4.part
